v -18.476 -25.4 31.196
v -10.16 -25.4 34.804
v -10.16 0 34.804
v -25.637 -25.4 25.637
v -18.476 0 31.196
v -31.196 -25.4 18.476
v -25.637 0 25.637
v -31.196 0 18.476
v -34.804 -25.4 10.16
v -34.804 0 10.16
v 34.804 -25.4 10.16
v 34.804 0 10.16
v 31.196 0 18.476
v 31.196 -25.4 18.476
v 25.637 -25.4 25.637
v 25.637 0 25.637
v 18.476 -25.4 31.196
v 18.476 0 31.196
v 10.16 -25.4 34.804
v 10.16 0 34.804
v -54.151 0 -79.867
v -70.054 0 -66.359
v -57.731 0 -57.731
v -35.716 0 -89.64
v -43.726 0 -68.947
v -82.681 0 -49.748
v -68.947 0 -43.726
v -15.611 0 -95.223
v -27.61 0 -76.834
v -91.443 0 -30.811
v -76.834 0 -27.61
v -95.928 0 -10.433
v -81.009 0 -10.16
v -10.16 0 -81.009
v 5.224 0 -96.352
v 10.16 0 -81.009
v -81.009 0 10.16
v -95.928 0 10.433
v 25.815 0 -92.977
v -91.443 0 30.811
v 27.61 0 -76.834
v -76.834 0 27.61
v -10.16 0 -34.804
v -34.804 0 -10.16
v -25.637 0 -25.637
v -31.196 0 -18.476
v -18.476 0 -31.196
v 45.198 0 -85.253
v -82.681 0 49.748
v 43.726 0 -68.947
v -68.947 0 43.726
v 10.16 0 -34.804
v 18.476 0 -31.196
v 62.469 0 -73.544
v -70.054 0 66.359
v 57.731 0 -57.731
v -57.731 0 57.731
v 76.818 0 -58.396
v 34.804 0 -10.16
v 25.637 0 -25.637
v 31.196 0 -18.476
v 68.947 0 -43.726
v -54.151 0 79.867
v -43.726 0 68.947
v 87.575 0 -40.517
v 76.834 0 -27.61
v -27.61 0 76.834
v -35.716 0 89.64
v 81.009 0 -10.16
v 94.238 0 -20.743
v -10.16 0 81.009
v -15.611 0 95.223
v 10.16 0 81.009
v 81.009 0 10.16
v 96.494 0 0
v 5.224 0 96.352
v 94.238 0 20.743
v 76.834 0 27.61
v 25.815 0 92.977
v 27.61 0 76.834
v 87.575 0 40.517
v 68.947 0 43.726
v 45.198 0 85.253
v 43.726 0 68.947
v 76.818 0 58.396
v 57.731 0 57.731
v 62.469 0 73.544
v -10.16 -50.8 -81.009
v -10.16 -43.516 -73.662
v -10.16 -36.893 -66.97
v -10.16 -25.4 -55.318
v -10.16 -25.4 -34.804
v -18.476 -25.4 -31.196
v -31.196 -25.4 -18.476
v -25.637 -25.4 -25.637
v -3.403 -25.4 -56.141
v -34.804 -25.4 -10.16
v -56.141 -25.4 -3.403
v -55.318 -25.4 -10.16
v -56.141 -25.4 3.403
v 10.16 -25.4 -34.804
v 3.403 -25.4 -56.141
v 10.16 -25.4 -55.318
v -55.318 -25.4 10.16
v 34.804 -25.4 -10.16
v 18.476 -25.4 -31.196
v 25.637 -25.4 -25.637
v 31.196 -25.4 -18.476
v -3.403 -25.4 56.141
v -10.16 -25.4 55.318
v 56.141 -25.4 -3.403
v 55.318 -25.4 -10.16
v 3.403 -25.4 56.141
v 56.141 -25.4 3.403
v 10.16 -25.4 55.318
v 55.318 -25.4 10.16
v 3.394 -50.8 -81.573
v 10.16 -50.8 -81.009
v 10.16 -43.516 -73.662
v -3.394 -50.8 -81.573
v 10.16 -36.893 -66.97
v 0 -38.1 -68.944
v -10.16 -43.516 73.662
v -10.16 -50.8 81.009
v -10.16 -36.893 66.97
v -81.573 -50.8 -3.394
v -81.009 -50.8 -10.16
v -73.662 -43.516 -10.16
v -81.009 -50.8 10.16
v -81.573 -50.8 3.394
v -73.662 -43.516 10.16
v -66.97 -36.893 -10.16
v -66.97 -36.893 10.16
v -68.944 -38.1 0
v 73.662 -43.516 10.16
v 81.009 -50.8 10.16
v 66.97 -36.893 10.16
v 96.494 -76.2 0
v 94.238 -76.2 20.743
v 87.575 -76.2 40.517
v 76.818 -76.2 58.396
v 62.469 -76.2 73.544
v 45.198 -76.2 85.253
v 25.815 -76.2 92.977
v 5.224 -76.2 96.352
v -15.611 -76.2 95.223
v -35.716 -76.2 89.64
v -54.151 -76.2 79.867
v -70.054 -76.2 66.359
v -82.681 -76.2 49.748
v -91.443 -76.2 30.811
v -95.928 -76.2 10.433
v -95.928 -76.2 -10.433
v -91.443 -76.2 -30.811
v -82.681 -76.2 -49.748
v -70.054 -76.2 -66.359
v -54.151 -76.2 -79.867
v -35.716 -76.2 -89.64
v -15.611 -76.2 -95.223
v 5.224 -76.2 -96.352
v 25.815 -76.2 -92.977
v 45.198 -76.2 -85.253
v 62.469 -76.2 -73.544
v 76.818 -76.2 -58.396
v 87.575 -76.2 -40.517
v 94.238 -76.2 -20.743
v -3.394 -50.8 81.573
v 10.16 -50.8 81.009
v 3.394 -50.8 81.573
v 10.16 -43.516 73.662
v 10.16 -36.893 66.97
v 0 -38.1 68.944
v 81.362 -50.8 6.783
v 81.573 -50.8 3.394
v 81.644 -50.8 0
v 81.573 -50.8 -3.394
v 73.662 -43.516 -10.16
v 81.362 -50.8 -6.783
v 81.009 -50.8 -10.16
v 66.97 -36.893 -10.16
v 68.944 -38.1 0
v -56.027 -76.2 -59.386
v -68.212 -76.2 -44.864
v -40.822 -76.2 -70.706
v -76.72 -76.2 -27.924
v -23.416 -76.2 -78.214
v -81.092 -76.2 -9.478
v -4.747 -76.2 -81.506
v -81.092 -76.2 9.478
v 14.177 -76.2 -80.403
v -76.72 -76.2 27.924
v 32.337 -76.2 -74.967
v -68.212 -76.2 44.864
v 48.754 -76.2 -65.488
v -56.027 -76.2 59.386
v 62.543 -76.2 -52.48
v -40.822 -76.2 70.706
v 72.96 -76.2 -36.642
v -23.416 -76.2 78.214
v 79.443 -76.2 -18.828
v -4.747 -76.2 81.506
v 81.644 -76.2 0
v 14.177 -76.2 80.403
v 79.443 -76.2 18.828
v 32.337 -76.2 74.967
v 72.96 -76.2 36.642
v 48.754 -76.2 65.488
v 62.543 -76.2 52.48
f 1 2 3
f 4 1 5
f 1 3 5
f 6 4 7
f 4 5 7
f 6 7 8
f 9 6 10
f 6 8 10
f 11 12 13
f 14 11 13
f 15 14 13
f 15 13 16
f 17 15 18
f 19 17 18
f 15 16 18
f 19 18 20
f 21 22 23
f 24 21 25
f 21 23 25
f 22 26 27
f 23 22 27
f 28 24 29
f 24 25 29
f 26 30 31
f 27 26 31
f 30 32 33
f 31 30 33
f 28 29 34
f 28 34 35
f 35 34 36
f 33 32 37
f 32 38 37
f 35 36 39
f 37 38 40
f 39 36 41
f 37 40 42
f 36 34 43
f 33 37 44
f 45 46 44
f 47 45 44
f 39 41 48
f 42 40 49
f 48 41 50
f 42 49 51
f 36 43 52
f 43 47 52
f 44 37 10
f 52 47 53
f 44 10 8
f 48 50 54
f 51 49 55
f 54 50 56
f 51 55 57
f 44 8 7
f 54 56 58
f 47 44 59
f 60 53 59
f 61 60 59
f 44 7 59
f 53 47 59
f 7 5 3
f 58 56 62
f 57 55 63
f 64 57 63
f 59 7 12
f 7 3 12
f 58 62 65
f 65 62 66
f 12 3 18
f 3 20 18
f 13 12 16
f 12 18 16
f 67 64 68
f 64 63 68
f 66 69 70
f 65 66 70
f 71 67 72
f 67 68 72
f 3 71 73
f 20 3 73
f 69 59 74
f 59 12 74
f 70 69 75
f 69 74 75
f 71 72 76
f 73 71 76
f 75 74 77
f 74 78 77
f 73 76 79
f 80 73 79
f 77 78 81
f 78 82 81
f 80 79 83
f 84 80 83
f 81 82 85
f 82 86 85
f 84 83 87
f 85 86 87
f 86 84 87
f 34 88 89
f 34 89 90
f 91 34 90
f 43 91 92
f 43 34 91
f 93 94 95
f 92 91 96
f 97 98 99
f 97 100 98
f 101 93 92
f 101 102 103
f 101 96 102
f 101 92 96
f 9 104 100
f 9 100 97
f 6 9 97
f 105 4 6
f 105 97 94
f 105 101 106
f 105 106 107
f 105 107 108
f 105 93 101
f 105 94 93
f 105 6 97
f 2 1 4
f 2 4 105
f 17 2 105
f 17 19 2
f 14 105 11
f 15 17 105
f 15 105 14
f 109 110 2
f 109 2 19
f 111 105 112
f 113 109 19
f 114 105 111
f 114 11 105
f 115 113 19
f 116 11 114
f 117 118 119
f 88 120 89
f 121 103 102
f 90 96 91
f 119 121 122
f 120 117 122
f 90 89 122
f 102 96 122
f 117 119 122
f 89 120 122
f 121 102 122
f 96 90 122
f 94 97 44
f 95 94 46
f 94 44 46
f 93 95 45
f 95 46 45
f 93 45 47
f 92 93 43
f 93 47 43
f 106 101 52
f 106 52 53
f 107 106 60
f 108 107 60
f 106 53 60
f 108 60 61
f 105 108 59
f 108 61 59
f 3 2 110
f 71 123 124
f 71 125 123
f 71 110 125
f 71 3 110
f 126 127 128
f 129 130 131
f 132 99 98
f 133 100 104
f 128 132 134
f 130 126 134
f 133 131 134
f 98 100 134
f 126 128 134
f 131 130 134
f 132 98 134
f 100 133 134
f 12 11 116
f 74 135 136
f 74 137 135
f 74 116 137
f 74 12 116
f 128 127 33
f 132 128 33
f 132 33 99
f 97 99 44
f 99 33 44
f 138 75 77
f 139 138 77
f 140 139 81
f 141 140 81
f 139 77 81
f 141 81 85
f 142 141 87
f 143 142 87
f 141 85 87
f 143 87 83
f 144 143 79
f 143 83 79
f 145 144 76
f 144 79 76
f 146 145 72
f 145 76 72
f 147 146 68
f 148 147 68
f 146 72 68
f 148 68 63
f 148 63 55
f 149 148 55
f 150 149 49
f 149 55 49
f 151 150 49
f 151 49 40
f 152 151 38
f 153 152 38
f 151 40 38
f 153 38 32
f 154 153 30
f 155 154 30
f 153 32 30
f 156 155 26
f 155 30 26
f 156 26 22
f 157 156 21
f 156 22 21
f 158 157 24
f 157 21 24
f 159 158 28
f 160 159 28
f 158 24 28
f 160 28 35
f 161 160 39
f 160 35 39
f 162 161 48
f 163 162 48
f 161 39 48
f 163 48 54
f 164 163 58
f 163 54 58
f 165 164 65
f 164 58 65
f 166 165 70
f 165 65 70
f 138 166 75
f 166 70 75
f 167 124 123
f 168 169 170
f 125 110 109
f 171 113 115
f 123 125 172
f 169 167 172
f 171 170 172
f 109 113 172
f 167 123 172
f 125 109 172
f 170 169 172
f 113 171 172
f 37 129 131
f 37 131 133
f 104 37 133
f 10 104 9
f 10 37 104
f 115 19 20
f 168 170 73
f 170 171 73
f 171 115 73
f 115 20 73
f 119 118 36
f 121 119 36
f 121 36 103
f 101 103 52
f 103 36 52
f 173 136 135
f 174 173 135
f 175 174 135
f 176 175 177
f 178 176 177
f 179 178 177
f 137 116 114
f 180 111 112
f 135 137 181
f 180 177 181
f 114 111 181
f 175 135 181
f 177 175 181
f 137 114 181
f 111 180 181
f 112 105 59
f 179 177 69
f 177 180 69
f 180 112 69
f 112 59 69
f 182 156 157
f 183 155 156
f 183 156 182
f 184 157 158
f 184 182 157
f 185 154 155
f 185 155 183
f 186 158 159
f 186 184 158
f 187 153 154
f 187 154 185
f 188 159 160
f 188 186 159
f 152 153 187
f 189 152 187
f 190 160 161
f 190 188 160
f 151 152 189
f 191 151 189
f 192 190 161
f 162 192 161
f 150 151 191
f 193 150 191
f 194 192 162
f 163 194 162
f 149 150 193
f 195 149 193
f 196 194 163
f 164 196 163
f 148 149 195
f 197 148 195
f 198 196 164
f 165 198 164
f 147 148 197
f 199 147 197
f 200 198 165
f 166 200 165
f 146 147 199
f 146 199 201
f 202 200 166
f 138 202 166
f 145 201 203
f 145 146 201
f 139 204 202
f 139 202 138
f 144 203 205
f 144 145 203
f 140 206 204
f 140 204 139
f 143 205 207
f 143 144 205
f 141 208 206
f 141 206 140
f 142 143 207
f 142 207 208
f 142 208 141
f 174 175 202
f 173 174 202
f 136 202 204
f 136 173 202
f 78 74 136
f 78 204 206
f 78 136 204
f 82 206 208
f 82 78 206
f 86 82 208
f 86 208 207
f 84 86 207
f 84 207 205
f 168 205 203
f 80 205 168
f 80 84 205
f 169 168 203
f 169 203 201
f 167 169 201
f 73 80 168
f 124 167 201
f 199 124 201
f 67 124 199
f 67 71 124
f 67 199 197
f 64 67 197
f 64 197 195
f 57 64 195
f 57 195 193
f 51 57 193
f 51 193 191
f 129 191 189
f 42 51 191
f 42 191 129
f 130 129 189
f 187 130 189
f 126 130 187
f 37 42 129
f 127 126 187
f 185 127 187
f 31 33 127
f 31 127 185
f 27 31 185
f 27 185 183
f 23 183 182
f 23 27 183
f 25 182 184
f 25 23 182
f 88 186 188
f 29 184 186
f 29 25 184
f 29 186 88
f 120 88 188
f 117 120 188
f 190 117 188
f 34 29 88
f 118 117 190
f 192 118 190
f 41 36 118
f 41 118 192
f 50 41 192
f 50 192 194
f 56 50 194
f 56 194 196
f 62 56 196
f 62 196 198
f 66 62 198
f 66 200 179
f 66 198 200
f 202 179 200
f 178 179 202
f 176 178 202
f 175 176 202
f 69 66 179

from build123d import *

# Parameters (mm, degrees)
F0_R     = 96.493777
F0_R_2   = 81.643771
F1_DEPTH = 76.2
F2_W     = 80.01
F2_H     = 20.32
F2_W_2   = 20.32
F2_H_2   = 80.01
F3_DEPTH = 25.4
F4_R     = 36.256565
F5_DEPTH = 25.4
F6_SIZE  = 25.4


with BuildPart() as f1:
    # F0 (on Front) → F1 (new body)
    with BuildSketch(Plane.XZ):
        Circle(F0_R)
        Circle(F0_R_2, mode=Mode.SUBTRACT)
    extrude(amount=F1_DEPTH)

    # F2 (on Front) → F3 (join)
    with BuildSketch(Plane.XZ):
        with Locations((-50.165, 0)):
            Rectangle(F2_W, F2_H)
        with Locations((0, -50.165)):
            Rectangle(F2_W_2, F2_H_2)
        with Locations((50.165, 0)):
            Rectangle(F2_W, F2_H)
        with Locations((0, 50.165)):
            Rectangle(F2_W_2, F2_H_2)
    extrude(amount=F3_DEPTH)

    # F4 (on Front) → F5 (join)
    with BuildSketch(Plane.XZ):
        Circle(F4_R)
    extrude(amount=F5_DEPTH)

    # F6
    f6_edges = [f1.edges().sort_by_distance(p)[0] for p in [
        (81.484957, -25.4, 5.089901),
        (0, -25.4, 81.643771),
        (-81.643771, -25.4, 0),
        (0, -25.4, -81.643771),
        (81.484957, -25.4, -5.089901),
    ]]
    chamfer(f6_edges, length=F6_SIZE)


solid = f1.part
